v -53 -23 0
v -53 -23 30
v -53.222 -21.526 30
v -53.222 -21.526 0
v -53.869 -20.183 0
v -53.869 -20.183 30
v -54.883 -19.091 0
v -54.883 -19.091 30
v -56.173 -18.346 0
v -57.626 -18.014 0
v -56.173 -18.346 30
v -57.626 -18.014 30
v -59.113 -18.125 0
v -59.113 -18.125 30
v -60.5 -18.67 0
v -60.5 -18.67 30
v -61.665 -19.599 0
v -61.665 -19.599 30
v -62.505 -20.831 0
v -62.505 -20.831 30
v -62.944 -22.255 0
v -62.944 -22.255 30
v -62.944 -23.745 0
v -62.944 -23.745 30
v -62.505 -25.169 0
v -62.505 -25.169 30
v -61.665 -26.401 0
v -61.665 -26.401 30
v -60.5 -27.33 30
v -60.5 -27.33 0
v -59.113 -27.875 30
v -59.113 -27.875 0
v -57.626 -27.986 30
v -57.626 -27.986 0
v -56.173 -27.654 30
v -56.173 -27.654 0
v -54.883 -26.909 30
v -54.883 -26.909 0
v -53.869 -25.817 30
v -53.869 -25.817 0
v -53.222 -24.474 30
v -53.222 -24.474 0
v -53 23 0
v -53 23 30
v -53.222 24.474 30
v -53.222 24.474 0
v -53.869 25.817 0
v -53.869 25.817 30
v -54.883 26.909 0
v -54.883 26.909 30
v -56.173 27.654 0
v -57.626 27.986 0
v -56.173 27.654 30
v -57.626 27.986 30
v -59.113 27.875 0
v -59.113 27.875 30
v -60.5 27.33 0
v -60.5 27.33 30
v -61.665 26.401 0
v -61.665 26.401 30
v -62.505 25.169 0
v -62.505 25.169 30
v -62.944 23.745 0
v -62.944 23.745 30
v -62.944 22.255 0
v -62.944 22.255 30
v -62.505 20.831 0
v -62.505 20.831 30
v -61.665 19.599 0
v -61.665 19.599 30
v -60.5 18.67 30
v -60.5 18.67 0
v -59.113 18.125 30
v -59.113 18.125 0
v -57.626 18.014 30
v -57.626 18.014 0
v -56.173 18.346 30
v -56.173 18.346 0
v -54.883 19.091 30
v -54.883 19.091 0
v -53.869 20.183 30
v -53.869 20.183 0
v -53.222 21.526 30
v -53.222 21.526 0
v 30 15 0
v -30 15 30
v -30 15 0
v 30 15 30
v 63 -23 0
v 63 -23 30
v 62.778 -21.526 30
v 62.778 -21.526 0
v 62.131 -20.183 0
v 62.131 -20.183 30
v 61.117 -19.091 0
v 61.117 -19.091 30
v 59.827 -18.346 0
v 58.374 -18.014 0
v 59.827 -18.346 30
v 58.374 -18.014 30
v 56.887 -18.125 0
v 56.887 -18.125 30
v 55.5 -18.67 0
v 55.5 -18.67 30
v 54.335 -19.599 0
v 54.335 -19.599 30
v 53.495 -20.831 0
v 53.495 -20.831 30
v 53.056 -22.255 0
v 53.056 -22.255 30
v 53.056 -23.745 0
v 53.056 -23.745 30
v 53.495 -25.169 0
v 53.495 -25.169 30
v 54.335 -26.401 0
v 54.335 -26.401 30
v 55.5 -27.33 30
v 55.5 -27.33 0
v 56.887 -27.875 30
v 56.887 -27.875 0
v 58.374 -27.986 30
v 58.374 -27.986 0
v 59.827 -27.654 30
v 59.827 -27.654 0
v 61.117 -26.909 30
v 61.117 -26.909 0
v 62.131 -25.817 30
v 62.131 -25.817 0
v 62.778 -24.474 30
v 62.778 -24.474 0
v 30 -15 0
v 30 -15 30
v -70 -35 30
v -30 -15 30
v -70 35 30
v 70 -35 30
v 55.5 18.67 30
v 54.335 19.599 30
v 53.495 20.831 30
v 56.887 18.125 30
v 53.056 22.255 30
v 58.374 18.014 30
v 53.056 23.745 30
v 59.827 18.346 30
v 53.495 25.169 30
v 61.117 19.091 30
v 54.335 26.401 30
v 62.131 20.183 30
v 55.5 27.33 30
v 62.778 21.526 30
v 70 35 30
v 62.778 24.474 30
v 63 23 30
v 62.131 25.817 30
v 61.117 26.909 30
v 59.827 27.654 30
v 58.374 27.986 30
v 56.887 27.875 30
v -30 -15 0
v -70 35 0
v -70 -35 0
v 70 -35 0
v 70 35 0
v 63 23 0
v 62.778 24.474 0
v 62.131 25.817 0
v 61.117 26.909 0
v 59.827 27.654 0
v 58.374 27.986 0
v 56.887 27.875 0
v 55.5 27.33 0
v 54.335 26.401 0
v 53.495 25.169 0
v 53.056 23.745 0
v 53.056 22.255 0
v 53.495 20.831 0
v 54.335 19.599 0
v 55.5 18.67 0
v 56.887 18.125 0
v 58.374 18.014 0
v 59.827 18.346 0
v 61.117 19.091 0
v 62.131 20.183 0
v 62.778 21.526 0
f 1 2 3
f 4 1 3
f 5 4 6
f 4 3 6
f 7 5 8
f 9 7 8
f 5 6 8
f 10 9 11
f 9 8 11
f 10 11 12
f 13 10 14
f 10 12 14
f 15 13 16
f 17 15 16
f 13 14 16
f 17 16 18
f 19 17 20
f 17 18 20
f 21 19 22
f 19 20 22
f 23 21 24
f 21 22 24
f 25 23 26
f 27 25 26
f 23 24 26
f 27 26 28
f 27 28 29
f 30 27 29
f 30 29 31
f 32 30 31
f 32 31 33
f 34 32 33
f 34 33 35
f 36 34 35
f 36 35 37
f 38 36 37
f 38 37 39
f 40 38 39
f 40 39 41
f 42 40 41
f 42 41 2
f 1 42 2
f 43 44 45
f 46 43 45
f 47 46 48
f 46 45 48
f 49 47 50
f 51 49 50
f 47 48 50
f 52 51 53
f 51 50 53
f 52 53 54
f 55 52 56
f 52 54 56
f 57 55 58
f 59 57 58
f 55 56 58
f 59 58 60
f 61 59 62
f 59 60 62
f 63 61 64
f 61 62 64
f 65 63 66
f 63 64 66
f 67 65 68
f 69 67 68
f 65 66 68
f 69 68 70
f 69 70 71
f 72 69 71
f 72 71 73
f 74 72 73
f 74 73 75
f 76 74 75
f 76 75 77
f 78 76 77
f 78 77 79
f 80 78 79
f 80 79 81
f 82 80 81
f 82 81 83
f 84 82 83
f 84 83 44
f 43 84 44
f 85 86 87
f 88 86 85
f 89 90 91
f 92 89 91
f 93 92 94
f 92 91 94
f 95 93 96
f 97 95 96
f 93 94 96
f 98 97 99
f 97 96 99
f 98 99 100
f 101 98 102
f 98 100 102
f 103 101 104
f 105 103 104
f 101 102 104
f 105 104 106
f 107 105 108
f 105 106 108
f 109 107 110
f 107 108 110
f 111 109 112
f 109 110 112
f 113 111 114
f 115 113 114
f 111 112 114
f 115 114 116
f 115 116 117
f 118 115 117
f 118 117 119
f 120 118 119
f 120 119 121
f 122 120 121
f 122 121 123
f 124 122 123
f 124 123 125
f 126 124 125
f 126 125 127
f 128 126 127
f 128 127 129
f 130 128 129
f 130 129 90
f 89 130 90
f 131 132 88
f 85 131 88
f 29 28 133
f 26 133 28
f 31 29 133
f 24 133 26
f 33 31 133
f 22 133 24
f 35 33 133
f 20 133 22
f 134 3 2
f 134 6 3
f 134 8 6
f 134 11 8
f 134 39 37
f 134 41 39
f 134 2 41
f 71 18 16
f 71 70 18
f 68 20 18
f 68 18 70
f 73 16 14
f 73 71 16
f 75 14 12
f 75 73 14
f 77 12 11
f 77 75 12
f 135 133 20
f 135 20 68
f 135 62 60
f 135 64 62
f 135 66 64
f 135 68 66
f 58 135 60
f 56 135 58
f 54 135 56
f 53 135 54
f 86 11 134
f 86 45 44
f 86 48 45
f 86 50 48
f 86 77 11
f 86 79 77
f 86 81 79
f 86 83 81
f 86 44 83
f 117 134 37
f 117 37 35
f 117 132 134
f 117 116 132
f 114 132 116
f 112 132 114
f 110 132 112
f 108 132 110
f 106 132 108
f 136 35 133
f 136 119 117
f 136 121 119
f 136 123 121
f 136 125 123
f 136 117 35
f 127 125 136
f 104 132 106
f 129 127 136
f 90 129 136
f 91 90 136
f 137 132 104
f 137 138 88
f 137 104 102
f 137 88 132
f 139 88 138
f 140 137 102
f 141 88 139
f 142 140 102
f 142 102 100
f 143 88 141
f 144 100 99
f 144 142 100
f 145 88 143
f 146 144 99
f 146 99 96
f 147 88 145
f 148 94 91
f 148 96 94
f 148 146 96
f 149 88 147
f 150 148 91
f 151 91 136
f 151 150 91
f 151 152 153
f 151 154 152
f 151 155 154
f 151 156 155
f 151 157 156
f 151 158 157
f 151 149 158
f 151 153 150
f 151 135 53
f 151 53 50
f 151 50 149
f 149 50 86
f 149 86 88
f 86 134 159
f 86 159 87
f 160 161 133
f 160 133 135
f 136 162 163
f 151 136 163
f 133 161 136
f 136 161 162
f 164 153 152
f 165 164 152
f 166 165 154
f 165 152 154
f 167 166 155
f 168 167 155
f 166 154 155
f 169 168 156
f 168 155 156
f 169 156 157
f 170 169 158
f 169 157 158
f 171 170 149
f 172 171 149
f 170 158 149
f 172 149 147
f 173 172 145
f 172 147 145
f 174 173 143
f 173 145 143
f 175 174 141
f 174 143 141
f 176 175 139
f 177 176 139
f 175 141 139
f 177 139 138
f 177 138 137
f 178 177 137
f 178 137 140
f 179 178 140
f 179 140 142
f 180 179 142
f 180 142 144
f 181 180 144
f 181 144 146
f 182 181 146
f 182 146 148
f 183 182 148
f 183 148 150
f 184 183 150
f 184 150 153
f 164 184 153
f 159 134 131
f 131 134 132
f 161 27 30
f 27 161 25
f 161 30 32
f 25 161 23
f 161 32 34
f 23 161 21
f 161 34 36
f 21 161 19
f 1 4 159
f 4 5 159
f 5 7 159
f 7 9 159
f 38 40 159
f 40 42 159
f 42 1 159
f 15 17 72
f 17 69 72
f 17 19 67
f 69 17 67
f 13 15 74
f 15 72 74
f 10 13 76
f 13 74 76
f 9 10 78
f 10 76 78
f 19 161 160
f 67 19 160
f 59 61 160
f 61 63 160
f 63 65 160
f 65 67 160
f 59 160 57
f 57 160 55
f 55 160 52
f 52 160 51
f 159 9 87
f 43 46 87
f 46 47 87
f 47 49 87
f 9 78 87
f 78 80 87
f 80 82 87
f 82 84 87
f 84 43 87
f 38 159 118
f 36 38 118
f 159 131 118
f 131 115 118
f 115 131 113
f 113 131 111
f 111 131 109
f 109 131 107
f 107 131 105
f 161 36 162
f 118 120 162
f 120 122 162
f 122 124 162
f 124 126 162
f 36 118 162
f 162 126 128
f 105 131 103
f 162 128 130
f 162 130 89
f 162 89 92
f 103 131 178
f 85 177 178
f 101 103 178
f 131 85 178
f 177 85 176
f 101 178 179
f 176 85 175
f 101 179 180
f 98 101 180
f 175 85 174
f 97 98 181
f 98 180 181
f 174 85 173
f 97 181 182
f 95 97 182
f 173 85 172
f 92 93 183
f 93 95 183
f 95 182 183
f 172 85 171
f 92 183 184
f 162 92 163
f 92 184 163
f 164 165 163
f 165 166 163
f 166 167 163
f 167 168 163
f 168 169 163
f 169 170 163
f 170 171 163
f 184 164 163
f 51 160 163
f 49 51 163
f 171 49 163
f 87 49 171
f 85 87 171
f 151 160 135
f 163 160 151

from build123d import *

# Parameters (mm, degrees)
ESBO_O1_W                = 140
ESBO_O1_H                = 70
RESSALTO_EXTRUS_O1_DEPTH = 30
ESBO_O2_W                = 60
ESBO_O2_H                = 30
CORTE_EXTRUS_O1_DEPTH    = 31
ESBO_O3_R                = 5
CORTE_EXTRUS_O3_DEPTH    = 31


with BuildPart() as part:
    # Esboço1 → Ressalto-extrusão1 (new body)
    with BuildSketch(Plane.XY):
        Rectangle(ESBO_O1_W, ESBO_O1_H)
    extrude(amount=RESSALTO_EXTRUS_O1_DEPTH)

    # Esboço2 → Corte-extrusão1 (cut, through all)
    with BuildSketch(Plane.XY.offset(30)):
        Rectangle(ESBO_O2_W, ESBO_O2_H)
    extrude(amount=-CORTE_EXTRUS_O1_DEPTH, mode=Mode.SUBTRACT)

    # Esboço3 → Corte-extrusão3 (cut, through all)
    with BuildSketch(Plane.XY.offset(30)):
        with Locations((-58, 23)):
            Circle(ESBO_O3_R)
        with Locations((58, 23)):
            Circle(ESBO_O3_R)
        with Locations((58, -23)):
            Circle(ESBO_O3_R)
        with Locations((-58, -23)):
            Circle(ESBO_O3_R)
    extrude(amount=-CORTE_EXTRUS_O3_DEPTH, mode=Mode.SUBTRACT)


solid = part.part
